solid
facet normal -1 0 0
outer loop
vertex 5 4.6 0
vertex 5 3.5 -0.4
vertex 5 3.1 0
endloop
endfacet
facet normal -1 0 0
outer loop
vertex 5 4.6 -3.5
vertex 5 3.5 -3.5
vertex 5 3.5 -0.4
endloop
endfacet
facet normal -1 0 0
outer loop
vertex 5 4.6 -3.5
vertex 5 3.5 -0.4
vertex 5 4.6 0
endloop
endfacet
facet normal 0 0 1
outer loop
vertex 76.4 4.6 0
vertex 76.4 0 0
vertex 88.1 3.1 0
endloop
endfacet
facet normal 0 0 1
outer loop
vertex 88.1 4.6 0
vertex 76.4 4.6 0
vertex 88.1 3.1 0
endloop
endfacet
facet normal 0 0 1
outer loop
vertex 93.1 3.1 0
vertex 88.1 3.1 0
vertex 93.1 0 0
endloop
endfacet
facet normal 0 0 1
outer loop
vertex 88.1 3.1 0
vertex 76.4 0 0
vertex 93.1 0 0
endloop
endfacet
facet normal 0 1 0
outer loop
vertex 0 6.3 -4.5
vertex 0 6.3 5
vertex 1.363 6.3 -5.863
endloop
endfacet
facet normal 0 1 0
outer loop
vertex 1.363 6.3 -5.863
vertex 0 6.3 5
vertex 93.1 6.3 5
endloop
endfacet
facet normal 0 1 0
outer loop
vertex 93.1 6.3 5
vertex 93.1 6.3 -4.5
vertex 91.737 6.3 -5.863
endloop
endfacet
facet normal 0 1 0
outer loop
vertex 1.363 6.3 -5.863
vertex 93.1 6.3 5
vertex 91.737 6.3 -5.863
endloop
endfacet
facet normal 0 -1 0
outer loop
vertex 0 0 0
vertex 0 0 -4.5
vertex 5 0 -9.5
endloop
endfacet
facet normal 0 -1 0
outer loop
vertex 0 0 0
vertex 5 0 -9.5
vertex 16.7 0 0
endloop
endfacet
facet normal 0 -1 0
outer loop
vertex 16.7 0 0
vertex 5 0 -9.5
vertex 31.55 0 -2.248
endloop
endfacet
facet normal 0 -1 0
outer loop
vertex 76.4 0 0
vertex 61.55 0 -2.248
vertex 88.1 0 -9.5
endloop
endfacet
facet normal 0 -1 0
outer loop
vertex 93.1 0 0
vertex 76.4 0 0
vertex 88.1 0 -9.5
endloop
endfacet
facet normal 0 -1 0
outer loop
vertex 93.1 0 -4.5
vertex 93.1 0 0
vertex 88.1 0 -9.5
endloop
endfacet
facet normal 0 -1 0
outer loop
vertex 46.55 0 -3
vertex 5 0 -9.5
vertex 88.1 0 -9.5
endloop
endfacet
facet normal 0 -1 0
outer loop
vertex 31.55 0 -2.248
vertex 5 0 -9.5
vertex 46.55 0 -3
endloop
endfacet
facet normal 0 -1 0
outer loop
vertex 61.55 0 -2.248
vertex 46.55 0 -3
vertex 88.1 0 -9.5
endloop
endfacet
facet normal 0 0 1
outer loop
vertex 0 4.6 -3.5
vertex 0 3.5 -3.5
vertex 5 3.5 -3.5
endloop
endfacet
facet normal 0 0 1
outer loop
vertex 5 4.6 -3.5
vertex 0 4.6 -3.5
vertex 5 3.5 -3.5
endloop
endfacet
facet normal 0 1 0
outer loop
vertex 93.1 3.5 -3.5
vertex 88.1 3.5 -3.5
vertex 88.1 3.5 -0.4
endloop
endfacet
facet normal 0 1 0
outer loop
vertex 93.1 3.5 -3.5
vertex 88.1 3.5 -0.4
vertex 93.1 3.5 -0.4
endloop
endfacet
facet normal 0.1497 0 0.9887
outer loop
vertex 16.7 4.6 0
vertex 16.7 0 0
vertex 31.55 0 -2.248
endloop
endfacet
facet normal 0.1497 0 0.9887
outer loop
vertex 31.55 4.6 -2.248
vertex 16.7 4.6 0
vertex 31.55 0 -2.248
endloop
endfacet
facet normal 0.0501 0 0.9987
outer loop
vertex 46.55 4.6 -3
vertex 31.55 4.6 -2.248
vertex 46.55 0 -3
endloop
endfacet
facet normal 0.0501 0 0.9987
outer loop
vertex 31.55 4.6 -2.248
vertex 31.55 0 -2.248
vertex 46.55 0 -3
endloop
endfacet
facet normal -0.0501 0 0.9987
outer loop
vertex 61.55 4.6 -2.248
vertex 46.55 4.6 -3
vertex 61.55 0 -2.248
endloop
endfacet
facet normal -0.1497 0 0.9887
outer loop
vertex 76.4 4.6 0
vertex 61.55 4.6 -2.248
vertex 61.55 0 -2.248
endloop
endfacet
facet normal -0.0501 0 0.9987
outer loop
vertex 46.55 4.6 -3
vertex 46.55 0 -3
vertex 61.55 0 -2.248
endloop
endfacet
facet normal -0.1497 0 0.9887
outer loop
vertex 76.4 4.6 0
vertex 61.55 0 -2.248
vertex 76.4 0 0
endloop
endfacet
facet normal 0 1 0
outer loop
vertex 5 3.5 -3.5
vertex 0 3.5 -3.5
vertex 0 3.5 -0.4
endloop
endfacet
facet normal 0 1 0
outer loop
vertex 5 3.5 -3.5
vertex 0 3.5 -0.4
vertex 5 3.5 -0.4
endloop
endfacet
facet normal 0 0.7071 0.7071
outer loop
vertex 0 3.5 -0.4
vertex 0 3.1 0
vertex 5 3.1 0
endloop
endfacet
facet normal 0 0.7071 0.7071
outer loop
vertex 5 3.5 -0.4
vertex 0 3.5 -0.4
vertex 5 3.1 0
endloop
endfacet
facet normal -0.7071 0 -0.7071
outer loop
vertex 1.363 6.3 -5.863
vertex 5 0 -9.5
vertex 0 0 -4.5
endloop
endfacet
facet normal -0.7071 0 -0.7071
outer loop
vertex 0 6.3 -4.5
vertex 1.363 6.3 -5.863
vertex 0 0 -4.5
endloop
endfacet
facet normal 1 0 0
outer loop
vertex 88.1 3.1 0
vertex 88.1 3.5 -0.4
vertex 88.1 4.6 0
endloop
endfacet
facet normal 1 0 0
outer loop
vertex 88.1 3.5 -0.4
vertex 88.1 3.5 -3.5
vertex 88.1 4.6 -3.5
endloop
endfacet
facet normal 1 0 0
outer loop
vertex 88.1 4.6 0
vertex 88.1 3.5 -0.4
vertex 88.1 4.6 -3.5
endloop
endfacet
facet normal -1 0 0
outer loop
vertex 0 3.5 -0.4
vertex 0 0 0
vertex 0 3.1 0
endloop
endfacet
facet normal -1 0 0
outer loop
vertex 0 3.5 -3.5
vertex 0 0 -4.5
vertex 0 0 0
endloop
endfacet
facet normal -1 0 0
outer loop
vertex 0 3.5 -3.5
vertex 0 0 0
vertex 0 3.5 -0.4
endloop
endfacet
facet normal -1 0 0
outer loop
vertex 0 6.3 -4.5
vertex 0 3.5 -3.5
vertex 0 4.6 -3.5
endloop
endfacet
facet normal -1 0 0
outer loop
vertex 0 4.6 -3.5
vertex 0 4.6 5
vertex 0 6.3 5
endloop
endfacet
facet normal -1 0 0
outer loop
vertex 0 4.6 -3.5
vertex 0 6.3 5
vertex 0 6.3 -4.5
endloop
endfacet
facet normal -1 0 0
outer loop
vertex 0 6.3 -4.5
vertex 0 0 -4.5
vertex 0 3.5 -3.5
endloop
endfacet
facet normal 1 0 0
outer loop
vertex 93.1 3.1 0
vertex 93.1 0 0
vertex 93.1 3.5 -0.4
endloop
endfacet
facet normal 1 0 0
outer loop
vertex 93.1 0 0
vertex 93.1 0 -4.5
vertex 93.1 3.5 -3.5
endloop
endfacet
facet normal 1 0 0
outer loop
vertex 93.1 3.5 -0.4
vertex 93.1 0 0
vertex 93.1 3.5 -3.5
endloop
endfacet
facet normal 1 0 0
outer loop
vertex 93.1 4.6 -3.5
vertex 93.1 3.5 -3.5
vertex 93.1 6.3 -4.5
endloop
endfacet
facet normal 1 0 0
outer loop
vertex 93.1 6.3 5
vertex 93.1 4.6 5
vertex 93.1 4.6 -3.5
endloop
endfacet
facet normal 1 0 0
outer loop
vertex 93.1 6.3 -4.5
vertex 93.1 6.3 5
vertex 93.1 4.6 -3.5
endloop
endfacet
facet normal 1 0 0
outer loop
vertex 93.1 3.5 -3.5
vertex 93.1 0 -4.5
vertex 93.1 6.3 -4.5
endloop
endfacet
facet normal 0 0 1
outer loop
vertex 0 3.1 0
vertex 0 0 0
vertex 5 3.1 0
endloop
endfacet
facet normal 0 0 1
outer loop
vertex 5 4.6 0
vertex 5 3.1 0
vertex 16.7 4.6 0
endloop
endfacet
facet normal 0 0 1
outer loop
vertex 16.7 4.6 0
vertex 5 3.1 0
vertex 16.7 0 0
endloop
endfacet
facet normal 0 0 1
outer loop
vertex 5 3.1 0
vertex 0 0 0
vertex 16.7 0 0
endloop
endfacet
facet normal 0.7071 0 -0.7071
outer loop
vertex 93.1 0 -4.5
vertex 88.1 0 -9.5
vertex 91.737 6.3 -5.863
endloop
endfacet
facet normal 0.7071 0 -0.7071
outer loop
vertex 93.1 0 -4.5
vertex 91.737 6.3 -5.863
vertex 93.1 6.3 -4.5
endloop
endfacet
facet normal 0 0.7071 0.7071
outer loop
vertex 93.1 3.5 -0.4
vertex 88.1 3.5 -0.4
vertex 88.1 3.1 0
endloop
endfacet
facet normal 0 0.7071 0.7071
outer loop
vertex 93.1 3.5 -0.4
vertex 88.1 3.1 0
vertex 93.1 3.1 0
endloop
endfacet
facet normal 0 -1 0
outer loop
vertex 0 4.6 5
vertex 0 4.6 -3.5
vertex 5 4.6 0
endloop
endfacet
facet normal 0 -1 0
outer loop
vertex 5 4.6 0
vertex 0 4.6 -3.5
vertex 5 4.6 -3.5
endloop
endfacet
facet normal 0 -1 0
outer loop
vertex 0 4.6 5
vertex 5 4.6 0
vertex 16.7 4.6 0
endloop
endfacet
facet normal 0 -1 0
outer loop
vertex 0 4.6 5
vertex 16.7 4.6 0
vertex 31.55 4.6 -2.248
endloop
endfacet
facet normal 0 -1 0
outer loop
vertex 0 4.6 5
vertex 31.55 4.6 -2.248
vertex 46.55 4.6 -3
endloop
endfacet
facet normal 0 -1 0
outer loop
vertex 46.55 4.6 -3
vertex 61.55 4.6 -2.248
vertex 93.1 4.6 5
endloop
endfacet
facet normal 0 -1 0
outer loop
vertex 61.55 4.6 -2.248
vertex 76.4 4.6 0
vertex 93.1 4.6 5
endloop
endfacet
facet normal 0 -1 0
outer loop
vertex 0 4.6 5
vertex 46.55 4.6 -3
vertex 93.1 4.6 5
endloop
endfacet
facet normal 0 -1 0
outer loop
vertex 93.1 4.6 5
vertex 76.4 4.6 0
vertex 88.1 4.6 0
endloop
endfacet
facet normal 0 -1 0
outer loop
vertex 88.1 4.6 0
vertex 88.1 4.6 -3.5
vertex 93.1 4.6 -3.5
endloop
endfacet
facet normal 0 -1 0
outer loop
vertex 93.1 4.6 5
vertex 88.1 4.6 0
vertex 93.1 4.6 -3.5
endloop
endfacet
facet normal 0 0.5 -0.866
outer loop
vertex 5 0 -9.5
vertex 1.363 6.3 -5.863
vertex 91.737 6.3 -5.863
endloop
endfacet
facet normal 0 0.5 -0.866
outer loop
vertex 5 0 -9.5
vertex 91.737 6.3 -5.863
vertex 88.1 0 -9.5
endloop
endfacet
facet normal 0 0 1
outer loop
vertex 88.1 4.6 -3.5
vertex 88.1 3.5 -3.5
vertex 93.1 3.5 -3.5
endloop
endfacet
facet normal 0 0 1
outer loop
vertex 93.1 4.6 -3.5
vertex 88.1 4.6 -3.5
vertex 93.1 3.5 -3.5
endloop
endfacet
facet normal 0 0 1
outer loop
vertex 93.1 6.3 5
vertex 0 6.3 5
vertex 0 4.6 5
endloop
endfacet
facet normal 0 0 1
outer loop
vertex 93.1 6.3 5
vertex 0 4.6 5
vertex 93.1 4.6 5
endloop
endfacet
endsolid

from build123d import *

# Parameters (mm, degrees)
SKETCH_2_W                  = 93.1
SKETCH_2_H                  = 10
EXTRUDE_1_DEPTH             = 3.5
SKETCH_4_W                  = 93.1
SKETCH_4_H                  = 6.5
EXTRUDE_2_DEPTH             = 1.1
SKETCH_5_W                  = 93.1
SKETCH_5_H                  = 10
EXTRUDE_3_DEPTH             = 2
CUT_EXTRUDE_1_DEPTH         = 94.867832616
SKETCH_7_W                  = 83.1
SKETCH_7_H                  = 1.1
EXTRUDE_4_DEPTH             = 3.5
CHAMFER_1_SIZE              = 0.4
CUT_EXTRUDE_2_REACH         = 95.868
SKETCH_8_R                  = 150
SKETCH_9_W                  = 93.1
SKETCH_9_H                  = 2
EXTRUDE_5_DEPTH             = 5
EXTRUDE_5_DIRECTION_2_REACH = 95.868
CUT_EXTRUDE_3_REACH         = 95.868
SKETCH_10_W                 = 11.362693304
SKETCH_10_H                 = 0.3
CUT_EXTRUDE_4_REACH         = 95.847
CUT_EXTRUDE_5_REACH         = 95.795


with BuildPart() as part:
    # 草图2 → 凸台-拉伸1 (new body)
    with BuildSketch(Plane(origin=(0, 0, 0), x_dir=(1, 0, 0), z_dir=(0, 1, 0))):
        with Locations((46.55, 5)):
            Rectangle(SKETCH_2_W, SKETCH_2_H)
    extrude(amount=EXTRUDE_1_DEPTH)

    # 草图4 → 凸台-拉伸2 (add)
    with BuildSketch(Plane(origin=(0, 3.5, 0), x_dir=(1, 0, 0), z_dir=(0, 1, 0))):
        with Locations((46.55, 6.75)):
            Rectangle(SKETCH_4_W, SKETCH_4_H)
    extrude(amount=EXTRUDE_2_DEPTH)

    # 草图5 → 凸台-拉伸3 (add)
    with BuildSketch(Plane(origin=(0, 4.6, 0), x_dir=(1, 0, 0), z_dir=(0, 1, 0))):
        with Locations((46.55, 5)):
            Rectangle(SKETCH_5_W, SKETCH_5_H)
    extrude(amount=EXTRUDE_3_DEPTH)

    # 草图6 → 切除-拉伸1 (cut, through all)
    with BuildSketch(Plane.ZY):
        Polygon((-10, 0), (-6.189488223, 6.6), (-10, 6.6), align=None)
    extrude(amount=-CUT_EXTRUDE_1_DEPTH, mode=Mode.SUBTRACT)

    # 草图7 → 凸台-拉伸4 (add)
    with BuildSketch(Plane.XY.offset(-3.5)):
        with Locations((46.55, 4.05)):
            Rectangle(SKETCH_7_W, SKETCH_7_H)
    extrude(amount=EXTRUDE_4_DEPTH)

    # 倒角1
    chamfer_1_edges = [part.edges().sort_by_distance(p)[0] for p in [
        (90.6, 3.5, 0),
        (2.5, 3.5, 0),
    ]]
    chamfer(chamfer_1_edges, length=CHAMFER_1_SIZE)

    # 草图8 → 切除-拉伸2 (cut, up to next)
    with BuildSketch(Plane.XZ, mode=Mode.PRIVATE) as cut_extrude_2_sk1:
        with Locations((46.55, 147)):
            Circle(SKETCH_8_R)
    cut_extrude_2_tool1 = extrude(cut_extrude_2_sk1.sketch, amount=-CUT_EXTRUDE_2_REACH, mode=Mode.PRIVATE) & part.part
    add(cut_extrude_2_tool1.solids().sort_by_distance((46.55, 0, 147))[0], mode=Mode.SUBTRACT)

    # 草图9 → 凸台-拉伸5 (add)
    with BuildSketch(Plane.XY):
        with Locations((46.55, 5.6)):
            Rectangle(SKETCH_9_W, SKETCH_9_H)
    extrude(amount=EXTRUDE_5_DEPTH)

    # 草图9 → 凸台-拉伸5 direction 2 (add, up to next)
    with BuildSketch(Plane.XY, mode=Mode.PRIVATE) as extrude_5_direction_2_sk1:
        with Locations((46.55, 5.6)):
            Rectangle(SKETCH_9_W, SKETCH_9_H)
    extrude_5_direction_2_tool1 = extrude(extrude_5_direction_2_sk1.sketch, amount=-EXTRUDE_5_DIRECTION_2_REACH, mode=Mode.PRIVATE) - part.part
    add(extrude_5_direction_2_tool1.solids().sort_by_distance((46.55, 5.6, 0))[0])

    # 草图10 → 切除-拉伸3 (cut, up to next)
    with BuildSketch(Plane(origin=(93.1, 0, 0), x_dir=(0, 0, -1), z_dir=(1, 0, 0)), mode=Mode.PRIVATE) as cut_extrude_3_sk1:
        with Locations((0.681346652, 6.45)):
            Rectangle(SKETCH_10_W, SKETCH_10_H)
    cut_extrude_3_tool1 = extrude(cut_extrude_3_sk1.sketch, amount=-CUT_EXTRUDE_3_REACH, mode=Mode.PRIVATE) & part.part
    add(cut_extrude_3_tool1.solids().sort_by_distance((93.1, 6.45, -0.681347))[0], mode=Mode.SUBTRACT)

    # 草图11 → 切除-拉伸4 (cut, up to next)
    with BuildSketch(Plane(origin=(93.1, 0, 0), x_dir=(0, 0, -1), z_dir=(1, 0, 0)), mode=Mode.PRIVATE) as cut_extrude_4_sk1:
        Polygon((6.362693304, 6.3), (5.862693304, 6.3), (9.5, 0), (10, 0), align=None)
    cut_extrude_4_tool1 = extrude(cut_extrude_4_sk1.sketch, amount=-CUT_EXTRUDE_4_REACH, mode=Mode.PRIVATE) & part.part
    add(cut_extrude_4_tool1.solids().sort_by_distance((93.1, 3.15, -7.931347))[0], mode=Mode.SUBTRACT)

    # 草图12 → 切除-拉伸5 (cut, up to next)
    with BuildSketch(Plane(origin=(0, 0, 0), x_dir=(1, 0, 0), z_dir=(0, 1, 0)), mode=Mode.PRIVATE) as cut_extrude_5_sk1:
        Polygon((0, 9.5), (5, 9.5), (0, 4.5), align=None)
    cut_extrude_5_tool1 = extrude(cut_extrude_5_sk1.sketch, amount=CUT_EXTRUDE_5_REACH, mode=Mode.PRIVATE) & part.part
    # 草图12 → 切除-拉伸5 (cut, up to next)
    with BuildSketch(Plane(origin=(0, 0, 0), x_dir=(1, 0, 0), z_dir=(0, 1, 0)), mode=Mode.PRIVATE) as cut_extrude_5_sk2:
        Polygon((93.1, 4.5), (93.1, 9.5), (88.1, 9.5), align=None)
    cut_extrude_5_tool2 = extrude(cut_extrude_5_sk2.sketch, amount=CUT_EXTRUDE_5_REACH, mode=Mode.PRIVATE) & part.part
    add(cut_extrude_5_tool1.solids().sort_by_distance((1.666667, 0, -7.833333))[0], mode=Mode.SUBTRACT)
    add(cut_extrude_5_tool2.solids().sort_by_distance((91.433333, 0, -7.833333))[0], mode=Mode.SUBTRACT)


solid = part.part
